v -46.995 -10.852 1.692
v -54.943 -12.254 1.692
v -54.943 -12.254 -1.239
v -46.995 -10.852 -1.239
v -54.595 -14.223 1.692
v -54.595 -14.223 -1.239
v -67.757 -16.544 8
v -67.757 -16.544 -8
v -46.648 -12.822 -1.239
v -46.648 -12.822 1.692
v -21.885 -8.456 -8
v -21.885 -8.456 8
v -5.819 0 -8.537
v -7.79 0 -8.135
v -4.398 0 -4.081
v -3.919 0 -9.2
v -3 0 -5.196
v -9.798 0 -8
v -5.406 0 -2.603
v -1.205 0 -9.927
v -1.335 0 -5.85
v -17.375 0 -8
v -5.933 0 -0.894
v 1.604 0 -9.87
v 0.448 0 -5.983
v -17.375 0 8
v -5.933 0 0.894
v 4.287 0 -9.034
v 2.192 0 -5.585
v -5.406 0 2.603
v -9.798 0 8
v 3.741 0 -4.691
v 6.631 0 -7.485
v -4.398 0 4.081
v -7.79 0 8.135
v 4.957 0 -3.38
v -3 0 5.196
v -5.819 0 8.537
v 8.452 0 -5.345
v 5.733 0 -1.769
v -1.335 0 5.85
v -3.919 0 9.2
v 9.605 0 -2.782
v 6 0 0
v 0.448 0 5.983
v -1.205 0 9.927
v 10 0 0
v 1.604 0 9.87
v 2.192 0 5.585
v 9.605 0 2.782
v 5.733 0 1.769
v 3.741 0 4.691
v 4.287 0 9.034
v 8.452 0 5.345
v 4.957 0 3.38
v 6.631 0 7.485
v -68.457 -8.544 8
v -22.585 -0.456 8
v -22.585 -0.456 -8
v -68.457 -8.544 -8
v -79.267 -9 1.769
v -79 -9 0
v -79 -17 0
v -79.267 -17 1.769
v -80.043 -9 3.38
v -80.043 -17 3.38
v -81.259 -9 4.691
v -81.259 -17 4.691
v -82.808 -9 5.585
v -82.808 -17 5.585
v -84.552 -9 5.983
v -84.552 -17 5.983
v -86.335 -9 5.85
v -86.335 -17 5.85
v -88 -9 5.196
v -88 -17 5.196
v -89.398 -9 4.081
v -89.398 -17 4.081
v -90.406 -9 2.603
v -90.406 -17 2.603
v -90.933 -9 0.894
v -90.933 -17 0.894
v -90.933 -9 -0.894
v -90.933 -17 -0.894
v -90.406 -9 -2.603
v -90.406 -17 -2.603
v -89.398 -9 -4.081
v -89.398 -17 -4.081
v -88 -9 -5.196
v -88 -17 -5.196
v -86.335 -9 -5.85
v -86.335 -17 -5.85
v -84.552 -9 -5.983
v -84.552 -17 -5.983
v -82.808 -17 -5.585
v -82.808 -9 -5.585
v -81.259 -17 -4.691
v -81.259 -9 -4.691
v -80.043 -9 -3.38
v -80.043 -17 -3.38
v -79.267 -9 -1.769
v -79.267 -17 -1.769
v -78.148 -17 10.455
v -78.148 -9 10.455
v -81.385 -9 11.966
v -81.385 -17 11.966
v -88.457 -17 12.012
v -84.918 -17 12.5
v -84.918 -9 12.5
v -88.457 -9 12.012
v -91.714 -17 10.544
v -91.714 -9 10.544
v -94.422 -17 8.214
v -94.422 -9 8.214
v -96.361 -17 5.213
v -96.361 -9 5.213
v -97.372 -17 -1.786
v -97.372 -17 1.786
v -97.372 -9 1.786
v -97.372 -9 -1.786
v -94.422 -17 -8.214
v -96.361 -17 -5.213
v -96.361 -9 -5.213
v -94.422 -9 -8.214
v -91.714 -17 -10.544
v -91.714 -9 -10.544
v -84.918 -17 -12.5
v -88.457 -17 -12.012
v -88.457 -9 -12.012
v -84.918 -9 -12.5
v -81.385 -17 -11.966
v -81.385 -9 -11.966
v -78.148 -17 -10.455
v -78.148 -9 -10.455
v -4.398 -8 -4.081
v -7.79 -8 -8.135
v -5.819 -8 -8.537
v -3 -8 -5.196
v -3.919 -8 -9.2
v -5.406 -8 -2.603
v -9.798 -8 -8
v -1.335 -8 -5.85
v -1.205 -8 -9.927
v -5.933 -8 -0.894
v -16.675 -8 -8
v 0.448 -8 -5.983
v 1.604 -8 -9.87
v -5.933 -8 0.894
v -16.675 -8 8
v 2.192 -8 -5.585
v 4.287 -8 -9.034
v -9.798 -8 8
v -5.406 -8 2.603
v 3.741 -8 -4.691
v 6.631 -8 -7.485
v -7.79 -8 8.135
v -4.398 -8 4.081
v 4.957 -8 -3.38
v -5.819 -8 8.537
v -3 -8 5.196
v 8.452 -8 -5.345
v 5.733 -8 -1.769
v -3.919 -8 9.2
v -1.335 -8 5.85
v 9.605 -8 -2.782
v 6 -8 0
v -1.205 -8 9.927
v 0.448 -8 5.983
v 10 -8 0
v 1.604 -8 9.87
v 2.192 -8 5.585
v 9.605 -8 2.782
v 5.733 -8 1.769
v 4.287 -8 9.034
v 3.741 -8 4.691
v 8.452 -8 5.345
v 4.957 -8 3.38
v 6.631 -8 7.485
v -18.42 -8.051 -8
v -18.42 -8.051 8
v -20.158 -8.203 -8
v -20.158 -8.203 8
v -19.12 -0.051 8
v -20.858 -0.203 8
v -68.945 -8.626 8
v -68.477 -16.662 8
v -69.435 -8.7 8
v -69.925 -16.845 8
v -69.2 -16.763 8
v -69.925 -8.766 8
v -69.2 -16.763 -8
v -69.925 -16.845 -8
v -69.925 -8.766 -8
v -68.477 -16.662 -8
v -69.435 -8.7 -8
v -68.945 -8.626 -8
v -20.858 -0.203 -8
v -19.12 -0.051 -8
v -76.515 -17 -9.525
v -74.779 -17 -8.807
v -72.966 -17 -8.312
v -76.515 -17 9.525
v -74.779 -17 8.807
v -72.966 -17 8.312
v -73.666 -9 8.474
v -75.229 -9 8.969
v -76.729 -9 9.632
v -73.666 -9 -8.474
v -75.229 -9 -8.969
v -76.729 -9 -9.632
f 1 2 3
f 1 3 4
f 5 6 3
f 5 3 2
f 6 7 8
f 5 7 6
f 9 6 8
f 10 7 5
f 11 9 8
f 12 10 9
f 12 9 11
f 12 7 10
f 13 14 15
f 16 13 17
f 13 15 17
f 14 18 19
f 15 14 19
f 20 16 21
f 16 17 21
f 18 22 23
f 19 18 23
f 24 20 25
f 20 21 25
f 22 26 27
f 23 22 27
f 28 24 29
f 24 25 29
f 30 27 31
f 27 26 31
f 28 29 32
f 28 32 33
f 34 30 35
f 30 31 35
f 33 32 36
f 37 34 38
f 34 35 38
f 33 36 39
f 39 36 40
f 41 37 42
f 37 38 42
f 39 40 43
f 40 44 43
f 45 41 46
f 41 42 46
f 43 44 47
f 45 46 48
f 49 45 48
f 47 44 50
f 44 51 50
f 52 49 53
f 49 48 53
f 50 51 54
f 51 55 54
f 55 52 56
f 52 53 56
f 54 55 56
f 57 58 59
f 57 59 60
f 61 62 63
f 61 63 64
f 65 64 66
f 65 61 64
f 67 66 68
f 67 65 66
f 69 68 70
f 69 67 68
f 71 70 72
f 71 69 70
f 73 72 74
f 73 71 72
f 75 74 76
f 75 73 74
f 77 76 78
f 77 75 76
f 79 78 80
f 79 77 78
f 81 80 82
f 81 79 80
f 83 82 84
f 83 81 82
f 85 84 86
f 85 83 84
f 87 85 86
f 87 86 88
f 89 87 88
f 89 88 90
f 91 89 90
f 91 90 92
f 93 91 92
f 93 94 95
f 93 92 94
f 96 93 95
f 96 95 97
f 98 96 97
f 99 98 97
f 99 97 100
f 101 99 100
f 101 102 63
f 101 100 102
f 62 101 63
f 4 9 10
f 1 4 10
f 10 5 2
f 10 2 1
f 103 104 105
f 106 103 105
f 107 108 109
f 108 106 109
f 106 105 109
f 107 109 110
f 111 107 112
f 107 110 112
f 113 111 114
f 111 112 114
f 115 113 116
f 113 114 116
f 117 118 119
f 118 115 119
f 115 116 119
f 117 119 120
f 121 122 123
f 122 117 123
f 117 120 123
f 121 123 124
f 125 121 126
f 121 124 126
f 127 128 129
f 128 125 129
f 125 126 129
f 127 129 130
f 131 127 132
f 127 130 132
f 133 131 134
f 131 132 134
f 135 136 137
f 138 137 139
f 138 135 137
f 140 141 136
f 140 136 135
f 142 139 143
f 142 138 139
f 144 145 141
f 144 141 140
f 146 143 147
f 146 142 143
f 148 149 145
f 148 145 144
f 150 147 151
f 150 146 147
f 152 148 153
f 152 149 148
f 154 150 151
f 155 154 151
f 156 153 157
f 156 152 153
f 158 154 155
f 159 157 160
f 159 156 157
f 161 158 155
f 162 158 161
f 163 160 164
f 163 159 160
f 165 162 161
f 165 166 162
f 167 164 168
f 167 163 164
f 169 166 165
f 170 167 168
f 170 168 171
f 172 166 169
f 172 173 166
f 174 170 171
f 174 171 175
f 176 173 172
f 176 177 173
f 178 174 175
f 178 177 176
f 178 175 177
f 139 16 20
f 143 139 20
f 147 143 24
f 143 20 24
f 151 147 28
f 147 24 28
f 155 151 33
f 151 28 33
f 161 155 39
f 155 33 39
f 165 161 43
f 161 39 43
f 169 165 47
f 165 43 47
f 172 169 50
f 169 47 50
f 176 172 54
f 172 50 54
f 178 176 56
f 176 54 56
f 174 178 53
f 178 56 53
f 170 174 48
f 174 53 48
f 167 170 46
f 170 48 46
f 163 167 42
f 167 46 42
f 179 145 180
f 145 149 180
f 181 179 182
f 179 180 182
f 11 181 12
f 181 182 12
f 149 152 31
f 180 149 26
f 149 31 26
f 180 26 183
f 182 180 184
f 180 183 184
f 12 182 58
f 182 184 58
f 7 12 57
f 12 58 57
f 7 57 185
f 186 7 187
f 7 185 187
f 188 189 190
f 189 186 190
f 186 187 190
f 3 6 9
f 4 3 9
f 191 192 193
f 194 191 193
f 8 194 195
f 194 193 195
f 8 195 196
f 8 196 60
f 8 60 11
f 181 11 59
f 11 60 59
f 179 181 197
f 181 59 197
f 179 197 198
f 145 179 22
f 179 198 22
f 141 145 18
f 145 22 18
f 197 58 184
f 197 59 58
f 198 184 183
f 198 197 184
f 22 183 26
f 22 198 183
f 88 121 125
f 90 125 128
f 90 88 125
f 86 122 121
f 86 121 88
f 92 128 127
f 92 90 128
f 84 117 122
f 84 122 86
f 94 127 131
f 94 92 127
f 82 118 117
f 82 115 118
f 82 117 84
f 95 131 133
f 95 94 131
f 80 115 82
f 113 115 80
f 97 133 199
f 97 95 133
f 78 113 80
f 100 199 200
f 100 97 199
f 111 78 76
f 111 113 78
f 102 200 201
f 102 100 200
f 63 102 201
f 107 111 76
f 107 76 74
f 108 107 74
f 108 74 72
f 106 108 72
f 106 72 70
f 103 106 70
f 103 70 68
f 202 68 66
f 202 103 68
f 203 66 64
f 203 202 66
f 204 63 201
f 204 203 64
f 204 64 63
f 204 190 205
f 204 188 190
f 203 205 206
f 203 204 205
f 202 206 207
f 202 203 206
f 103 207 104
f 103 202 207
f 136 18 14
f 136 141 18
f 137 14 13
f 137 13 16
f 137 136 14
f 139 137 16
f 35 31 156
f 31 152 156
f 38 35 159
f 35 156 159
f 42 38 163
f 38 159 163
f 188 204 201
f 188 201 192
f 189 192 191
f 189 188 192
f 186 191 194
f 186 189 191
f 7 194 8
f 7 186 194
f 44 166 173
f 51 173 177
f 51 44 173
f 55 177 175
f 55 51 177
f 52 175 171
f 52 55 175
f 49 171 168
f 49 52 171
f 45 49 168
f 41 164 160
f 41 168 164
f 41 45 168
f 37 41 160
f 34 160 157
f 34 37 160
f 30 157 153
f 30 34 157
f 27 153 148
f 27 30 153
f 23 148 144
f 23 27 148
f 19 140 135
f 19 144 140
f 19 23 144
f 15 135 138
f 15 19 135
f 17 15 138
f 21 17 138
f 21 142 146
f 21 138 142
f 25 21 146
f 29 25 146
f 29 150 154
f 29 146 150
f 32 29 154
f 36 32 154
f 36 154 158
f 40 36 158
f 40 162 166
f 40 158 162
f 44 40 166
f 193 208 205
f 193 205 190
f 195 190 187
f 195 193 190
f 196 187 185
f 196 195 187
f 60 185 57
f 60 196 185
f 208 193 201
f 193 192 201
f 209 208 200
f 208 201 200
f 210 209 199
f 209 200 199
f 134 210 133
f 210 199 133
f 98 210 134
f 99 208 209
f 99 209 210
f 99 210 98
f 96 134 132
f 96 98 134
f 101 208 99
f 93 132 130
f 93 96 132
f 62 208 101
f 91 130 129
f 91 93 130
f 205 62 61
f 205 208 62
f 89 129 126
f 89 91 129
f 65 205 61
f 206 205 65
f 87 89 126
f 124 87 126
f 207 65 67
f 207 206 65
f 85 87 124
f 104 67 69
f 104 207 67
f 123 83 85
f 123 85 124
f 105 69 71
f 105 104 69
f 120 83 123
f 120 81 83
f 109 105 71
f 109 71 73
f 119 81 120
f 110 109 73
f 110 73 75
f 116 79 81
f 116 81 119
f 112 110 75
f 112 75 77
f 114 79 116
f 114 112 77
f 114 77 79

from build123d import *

# Parameters (mm, degrees)
F0_R     = 6
F1_DEPTH = 25
F3_DEPTH = 20
F4_R     = 30
F5_R     = 15
F6_W     = 8.0703347921
F6_H     = 2.9308869271
F7_DEPTH = 2


with BuildPart() as f1:
    # F0 (on Front) → F1 (new body)
    with BuildSketch(Plane.XZ):
        with BuildLine():
            ThreePointArc((-72.5, 0), (-73.2460947032, 4.2539052968), (-75.3953136439, 8))
            ThreePointArc((-75.3953136439, 8), (-97.5, 0), (-75.3953136439, -8))
            ThreePointArc((-75.3953136439, -8), (-73.2460947032, -4.2539052968), (-72.5, 0))
        make_face()
        with Locations((-85, 0)):
            Circle(F0_R, mode=Mode.SUBTRACT)
        with BuildLine():
            ThreePointArc((-6, -8), (-10, 0), (-6, 8))
            Line((-6, 8), (-75.3953136439, 8))
            ThreePointArc((-75.3953136439, 8), (-73.2460947032, 4.2539052968), (-72.5, 0))
            ThreePointArc((-72.5, 0), (-73.2460947032, -4.2539052968), (-75.3953136439, -8))
            Line((-75.3953136439, -8), (-6, -8))
        make_face()
        with BuildLine():
            ThreePointArc((-6, -8), (4.472135955, -8.94427191), (10, 0))
            ThreePointArc((10, 0), (4.472135955, 8.94427191), (-6, 8))
            ThreePointArc((-6, 8), (-10, 0), (-6, -8))
        make_face()
        Circle(F0_R, mode=Mode.SUBTRACT)
    extrude(amount=F1_DEPTH)

    # F2 (on Top) → F3 (intersect, symmetric)
    with BuildSketch(Plane.XY):
        Polygon((-71.0415363766, -9), (-110.2200075984, -9), (-110.2200075984, -17), (-70.3416270684, -17), (-19.3000906918, -8), (29.2156469077, -8), (29.2156469077, 0), (-20, 0), align=None)
    extrude(amount=F3_DEPTH, both=True, mode=Mode.INTERSECT)

    # F4
    f4_edges = [f1.edges().sort_by_distance(p)[0] for p in [
        (-70.341627, -17, 0),
        (-19.300091, -8, 0),
        (-20, 0, 0),
        (-71.041536, -9, 0),
    ]]
    fillet(f4_edges, radius=F4_R)

    # F5 (call 1 of 4: OpenCascade refuses the feature's edges together)
    f5_edges = [f1.edges().sort_by_distance(p)[0] for p in [
        (-75.395314, -13, 8),
    ]]
    fillet(f5_edges, radius=F5_R)

    # F5#2 (call 2 of 4)
    f5_2_edges = [f1.edges().sort_by_distance(p)[0] for p in [
        (-6, -4, 8),
    ]]
    fillet(f5_2_edges, radius=F5_R)

    # F5#3 (call 3 of 4)
    f5_3_edges = [f1.edges().sort_by_distance(p)[0] for p in [
        (-75.395314, -13, -8),
    ]]
    fillet(f5_3_edges, radius=F5_R)

    # F5#4 (call 4 of 4)
    f5_4_edges = [f1.edges().sort_by_distance(p)[0] for p in [
        (-6, -4, -8),
    ]]
    fillet(f5_4_edges, radius=F5_R)

    # F6 (on face) → F7 (cut)
    with BuildSketch(Plane(origin=(0.7861116292, -4.4582605908, 0), x_dir=(0.984807753, 0.1736481777, 0), z_dir=(0.1736481777, -0.984807753, 0))):
        with Locations((-52.2005781531, 0.226563483)):
            Rectangle(F6_W, F6_H)
    extrude(amount=-F7_DEPTH, mode=Mode.SUBTRACT)


solid = f1.part
